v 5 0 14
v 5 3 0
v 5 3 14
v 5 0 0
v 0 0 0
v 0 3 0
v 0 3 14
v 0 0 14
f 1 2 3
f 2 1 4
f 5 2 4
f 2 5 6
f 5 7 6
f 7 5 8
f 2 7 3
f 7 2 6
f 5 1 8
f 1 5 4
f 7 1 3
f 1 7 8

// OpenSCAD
translate([2.5, 1.5, 1.0]) color([0.11099692345616674, 0.060160827712116616, 0.7008174245595068]) cube([5, 3, 2], center=true);
translate([2.5, 1.5, 3.0]) color([0.6143308403515266, 0.9339155207415325, 0.6504721799814983]) cube([5, 3, 2], center=true);
translate([2.5, 1.5, 5.0]) color([0.9694854220936419, 0.7136168898793864, 0.2963863893491513]) cube([5, 3, 2], center=true);
translate([2.5, 1.5, 7.0]) color([0.8491315553121948, 0.95846907728749, 0.38764569013819994]) cube([5, 3, 2], center=true);
translate([2.5, 1.5, 9.0]) color([0.29380353478258403, 0.7457841029207014, 0.9575468650535228]) cube([5, 3, 2], center=true);
translate([2.5, 1.5, 11.0]) color([0.98339807845839, 0.12155240415787172, 0.8604321836344089]) cube([5, 3, 2], center=true);
translate([2.5, 1.5, 13.0]) color([0.9958411320233901, 0.03818441020037311, 0.39202639046743215]) cube([5, 3, 2], center=true);
